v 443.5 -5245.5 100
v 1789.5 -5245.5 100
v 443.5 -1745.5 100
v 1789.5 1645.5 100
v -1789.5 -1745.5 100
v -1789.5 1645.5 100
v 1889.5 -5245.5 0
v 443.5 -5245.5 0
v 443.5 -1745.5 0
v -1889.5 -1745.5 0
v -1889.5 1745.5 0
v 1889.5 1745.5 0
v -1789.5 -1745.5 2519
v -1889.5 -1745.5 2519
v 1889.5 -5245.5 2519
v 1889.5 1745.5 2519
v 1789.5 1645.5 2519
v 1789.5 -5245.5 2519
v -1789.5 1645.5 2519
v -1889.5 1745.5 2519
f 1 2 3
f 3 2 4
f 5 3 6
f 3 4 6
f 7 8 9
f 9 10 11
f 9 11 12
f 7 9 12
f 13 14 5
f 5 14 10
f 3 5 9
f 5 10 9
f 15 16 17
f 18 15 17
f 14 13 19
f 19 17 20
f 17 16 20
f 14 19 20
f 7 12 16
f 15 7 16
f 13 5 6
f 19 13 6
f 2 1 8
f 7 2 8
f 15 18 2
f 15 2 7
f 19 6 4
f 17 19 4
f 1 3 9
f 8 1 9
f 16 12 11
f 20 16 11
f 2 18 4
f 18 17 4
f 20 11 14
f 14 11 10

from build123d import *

# Parameters (mm, degrees)
F0_W     = 3779
F0_H     = 3491
F1_DEPTH = 100
F3_DEPTH = 2419
F5_DEPTH = 3500


with BuildPart() as f1:
    # F0 (on Top) → F1 (new body)
    with BuildSketch(Plane.XY):
        Rectangle(F0_W, F0_H)
    extrude(amount=F1_DEPTH)

    # F2 (on face) → F3 (join)
    with BuildSketch(Plane.XY.offset(100)):
        Polygon((-1789.5, 1745.5), (-1889.5, 1745.5), (-1889.5, -1745.5), (-1789.5, -1745.5), (-1789.5, 1645.5), (1789.5, 1645.5), (1789.5, -1645.5), (1789.5, -1745.5), (1889.5, -1745.5), (1889.5, 1745.5), (1789.5, 1745.5), align=None)
    extrude(amount=F3_DEPTH)

    # F4 (on face) → F5 (join)
    with BuildSketch(Plane.XZ.offset(1745.5)):
        Polygon((1889.5, 2519), (1789.5, 2519), (1789.5, 100), (443.5, 100), (443.5, 0), (1889.5, 0), align=None)
    extrude(amount=F5_DEPTH)


solid = f1.part
